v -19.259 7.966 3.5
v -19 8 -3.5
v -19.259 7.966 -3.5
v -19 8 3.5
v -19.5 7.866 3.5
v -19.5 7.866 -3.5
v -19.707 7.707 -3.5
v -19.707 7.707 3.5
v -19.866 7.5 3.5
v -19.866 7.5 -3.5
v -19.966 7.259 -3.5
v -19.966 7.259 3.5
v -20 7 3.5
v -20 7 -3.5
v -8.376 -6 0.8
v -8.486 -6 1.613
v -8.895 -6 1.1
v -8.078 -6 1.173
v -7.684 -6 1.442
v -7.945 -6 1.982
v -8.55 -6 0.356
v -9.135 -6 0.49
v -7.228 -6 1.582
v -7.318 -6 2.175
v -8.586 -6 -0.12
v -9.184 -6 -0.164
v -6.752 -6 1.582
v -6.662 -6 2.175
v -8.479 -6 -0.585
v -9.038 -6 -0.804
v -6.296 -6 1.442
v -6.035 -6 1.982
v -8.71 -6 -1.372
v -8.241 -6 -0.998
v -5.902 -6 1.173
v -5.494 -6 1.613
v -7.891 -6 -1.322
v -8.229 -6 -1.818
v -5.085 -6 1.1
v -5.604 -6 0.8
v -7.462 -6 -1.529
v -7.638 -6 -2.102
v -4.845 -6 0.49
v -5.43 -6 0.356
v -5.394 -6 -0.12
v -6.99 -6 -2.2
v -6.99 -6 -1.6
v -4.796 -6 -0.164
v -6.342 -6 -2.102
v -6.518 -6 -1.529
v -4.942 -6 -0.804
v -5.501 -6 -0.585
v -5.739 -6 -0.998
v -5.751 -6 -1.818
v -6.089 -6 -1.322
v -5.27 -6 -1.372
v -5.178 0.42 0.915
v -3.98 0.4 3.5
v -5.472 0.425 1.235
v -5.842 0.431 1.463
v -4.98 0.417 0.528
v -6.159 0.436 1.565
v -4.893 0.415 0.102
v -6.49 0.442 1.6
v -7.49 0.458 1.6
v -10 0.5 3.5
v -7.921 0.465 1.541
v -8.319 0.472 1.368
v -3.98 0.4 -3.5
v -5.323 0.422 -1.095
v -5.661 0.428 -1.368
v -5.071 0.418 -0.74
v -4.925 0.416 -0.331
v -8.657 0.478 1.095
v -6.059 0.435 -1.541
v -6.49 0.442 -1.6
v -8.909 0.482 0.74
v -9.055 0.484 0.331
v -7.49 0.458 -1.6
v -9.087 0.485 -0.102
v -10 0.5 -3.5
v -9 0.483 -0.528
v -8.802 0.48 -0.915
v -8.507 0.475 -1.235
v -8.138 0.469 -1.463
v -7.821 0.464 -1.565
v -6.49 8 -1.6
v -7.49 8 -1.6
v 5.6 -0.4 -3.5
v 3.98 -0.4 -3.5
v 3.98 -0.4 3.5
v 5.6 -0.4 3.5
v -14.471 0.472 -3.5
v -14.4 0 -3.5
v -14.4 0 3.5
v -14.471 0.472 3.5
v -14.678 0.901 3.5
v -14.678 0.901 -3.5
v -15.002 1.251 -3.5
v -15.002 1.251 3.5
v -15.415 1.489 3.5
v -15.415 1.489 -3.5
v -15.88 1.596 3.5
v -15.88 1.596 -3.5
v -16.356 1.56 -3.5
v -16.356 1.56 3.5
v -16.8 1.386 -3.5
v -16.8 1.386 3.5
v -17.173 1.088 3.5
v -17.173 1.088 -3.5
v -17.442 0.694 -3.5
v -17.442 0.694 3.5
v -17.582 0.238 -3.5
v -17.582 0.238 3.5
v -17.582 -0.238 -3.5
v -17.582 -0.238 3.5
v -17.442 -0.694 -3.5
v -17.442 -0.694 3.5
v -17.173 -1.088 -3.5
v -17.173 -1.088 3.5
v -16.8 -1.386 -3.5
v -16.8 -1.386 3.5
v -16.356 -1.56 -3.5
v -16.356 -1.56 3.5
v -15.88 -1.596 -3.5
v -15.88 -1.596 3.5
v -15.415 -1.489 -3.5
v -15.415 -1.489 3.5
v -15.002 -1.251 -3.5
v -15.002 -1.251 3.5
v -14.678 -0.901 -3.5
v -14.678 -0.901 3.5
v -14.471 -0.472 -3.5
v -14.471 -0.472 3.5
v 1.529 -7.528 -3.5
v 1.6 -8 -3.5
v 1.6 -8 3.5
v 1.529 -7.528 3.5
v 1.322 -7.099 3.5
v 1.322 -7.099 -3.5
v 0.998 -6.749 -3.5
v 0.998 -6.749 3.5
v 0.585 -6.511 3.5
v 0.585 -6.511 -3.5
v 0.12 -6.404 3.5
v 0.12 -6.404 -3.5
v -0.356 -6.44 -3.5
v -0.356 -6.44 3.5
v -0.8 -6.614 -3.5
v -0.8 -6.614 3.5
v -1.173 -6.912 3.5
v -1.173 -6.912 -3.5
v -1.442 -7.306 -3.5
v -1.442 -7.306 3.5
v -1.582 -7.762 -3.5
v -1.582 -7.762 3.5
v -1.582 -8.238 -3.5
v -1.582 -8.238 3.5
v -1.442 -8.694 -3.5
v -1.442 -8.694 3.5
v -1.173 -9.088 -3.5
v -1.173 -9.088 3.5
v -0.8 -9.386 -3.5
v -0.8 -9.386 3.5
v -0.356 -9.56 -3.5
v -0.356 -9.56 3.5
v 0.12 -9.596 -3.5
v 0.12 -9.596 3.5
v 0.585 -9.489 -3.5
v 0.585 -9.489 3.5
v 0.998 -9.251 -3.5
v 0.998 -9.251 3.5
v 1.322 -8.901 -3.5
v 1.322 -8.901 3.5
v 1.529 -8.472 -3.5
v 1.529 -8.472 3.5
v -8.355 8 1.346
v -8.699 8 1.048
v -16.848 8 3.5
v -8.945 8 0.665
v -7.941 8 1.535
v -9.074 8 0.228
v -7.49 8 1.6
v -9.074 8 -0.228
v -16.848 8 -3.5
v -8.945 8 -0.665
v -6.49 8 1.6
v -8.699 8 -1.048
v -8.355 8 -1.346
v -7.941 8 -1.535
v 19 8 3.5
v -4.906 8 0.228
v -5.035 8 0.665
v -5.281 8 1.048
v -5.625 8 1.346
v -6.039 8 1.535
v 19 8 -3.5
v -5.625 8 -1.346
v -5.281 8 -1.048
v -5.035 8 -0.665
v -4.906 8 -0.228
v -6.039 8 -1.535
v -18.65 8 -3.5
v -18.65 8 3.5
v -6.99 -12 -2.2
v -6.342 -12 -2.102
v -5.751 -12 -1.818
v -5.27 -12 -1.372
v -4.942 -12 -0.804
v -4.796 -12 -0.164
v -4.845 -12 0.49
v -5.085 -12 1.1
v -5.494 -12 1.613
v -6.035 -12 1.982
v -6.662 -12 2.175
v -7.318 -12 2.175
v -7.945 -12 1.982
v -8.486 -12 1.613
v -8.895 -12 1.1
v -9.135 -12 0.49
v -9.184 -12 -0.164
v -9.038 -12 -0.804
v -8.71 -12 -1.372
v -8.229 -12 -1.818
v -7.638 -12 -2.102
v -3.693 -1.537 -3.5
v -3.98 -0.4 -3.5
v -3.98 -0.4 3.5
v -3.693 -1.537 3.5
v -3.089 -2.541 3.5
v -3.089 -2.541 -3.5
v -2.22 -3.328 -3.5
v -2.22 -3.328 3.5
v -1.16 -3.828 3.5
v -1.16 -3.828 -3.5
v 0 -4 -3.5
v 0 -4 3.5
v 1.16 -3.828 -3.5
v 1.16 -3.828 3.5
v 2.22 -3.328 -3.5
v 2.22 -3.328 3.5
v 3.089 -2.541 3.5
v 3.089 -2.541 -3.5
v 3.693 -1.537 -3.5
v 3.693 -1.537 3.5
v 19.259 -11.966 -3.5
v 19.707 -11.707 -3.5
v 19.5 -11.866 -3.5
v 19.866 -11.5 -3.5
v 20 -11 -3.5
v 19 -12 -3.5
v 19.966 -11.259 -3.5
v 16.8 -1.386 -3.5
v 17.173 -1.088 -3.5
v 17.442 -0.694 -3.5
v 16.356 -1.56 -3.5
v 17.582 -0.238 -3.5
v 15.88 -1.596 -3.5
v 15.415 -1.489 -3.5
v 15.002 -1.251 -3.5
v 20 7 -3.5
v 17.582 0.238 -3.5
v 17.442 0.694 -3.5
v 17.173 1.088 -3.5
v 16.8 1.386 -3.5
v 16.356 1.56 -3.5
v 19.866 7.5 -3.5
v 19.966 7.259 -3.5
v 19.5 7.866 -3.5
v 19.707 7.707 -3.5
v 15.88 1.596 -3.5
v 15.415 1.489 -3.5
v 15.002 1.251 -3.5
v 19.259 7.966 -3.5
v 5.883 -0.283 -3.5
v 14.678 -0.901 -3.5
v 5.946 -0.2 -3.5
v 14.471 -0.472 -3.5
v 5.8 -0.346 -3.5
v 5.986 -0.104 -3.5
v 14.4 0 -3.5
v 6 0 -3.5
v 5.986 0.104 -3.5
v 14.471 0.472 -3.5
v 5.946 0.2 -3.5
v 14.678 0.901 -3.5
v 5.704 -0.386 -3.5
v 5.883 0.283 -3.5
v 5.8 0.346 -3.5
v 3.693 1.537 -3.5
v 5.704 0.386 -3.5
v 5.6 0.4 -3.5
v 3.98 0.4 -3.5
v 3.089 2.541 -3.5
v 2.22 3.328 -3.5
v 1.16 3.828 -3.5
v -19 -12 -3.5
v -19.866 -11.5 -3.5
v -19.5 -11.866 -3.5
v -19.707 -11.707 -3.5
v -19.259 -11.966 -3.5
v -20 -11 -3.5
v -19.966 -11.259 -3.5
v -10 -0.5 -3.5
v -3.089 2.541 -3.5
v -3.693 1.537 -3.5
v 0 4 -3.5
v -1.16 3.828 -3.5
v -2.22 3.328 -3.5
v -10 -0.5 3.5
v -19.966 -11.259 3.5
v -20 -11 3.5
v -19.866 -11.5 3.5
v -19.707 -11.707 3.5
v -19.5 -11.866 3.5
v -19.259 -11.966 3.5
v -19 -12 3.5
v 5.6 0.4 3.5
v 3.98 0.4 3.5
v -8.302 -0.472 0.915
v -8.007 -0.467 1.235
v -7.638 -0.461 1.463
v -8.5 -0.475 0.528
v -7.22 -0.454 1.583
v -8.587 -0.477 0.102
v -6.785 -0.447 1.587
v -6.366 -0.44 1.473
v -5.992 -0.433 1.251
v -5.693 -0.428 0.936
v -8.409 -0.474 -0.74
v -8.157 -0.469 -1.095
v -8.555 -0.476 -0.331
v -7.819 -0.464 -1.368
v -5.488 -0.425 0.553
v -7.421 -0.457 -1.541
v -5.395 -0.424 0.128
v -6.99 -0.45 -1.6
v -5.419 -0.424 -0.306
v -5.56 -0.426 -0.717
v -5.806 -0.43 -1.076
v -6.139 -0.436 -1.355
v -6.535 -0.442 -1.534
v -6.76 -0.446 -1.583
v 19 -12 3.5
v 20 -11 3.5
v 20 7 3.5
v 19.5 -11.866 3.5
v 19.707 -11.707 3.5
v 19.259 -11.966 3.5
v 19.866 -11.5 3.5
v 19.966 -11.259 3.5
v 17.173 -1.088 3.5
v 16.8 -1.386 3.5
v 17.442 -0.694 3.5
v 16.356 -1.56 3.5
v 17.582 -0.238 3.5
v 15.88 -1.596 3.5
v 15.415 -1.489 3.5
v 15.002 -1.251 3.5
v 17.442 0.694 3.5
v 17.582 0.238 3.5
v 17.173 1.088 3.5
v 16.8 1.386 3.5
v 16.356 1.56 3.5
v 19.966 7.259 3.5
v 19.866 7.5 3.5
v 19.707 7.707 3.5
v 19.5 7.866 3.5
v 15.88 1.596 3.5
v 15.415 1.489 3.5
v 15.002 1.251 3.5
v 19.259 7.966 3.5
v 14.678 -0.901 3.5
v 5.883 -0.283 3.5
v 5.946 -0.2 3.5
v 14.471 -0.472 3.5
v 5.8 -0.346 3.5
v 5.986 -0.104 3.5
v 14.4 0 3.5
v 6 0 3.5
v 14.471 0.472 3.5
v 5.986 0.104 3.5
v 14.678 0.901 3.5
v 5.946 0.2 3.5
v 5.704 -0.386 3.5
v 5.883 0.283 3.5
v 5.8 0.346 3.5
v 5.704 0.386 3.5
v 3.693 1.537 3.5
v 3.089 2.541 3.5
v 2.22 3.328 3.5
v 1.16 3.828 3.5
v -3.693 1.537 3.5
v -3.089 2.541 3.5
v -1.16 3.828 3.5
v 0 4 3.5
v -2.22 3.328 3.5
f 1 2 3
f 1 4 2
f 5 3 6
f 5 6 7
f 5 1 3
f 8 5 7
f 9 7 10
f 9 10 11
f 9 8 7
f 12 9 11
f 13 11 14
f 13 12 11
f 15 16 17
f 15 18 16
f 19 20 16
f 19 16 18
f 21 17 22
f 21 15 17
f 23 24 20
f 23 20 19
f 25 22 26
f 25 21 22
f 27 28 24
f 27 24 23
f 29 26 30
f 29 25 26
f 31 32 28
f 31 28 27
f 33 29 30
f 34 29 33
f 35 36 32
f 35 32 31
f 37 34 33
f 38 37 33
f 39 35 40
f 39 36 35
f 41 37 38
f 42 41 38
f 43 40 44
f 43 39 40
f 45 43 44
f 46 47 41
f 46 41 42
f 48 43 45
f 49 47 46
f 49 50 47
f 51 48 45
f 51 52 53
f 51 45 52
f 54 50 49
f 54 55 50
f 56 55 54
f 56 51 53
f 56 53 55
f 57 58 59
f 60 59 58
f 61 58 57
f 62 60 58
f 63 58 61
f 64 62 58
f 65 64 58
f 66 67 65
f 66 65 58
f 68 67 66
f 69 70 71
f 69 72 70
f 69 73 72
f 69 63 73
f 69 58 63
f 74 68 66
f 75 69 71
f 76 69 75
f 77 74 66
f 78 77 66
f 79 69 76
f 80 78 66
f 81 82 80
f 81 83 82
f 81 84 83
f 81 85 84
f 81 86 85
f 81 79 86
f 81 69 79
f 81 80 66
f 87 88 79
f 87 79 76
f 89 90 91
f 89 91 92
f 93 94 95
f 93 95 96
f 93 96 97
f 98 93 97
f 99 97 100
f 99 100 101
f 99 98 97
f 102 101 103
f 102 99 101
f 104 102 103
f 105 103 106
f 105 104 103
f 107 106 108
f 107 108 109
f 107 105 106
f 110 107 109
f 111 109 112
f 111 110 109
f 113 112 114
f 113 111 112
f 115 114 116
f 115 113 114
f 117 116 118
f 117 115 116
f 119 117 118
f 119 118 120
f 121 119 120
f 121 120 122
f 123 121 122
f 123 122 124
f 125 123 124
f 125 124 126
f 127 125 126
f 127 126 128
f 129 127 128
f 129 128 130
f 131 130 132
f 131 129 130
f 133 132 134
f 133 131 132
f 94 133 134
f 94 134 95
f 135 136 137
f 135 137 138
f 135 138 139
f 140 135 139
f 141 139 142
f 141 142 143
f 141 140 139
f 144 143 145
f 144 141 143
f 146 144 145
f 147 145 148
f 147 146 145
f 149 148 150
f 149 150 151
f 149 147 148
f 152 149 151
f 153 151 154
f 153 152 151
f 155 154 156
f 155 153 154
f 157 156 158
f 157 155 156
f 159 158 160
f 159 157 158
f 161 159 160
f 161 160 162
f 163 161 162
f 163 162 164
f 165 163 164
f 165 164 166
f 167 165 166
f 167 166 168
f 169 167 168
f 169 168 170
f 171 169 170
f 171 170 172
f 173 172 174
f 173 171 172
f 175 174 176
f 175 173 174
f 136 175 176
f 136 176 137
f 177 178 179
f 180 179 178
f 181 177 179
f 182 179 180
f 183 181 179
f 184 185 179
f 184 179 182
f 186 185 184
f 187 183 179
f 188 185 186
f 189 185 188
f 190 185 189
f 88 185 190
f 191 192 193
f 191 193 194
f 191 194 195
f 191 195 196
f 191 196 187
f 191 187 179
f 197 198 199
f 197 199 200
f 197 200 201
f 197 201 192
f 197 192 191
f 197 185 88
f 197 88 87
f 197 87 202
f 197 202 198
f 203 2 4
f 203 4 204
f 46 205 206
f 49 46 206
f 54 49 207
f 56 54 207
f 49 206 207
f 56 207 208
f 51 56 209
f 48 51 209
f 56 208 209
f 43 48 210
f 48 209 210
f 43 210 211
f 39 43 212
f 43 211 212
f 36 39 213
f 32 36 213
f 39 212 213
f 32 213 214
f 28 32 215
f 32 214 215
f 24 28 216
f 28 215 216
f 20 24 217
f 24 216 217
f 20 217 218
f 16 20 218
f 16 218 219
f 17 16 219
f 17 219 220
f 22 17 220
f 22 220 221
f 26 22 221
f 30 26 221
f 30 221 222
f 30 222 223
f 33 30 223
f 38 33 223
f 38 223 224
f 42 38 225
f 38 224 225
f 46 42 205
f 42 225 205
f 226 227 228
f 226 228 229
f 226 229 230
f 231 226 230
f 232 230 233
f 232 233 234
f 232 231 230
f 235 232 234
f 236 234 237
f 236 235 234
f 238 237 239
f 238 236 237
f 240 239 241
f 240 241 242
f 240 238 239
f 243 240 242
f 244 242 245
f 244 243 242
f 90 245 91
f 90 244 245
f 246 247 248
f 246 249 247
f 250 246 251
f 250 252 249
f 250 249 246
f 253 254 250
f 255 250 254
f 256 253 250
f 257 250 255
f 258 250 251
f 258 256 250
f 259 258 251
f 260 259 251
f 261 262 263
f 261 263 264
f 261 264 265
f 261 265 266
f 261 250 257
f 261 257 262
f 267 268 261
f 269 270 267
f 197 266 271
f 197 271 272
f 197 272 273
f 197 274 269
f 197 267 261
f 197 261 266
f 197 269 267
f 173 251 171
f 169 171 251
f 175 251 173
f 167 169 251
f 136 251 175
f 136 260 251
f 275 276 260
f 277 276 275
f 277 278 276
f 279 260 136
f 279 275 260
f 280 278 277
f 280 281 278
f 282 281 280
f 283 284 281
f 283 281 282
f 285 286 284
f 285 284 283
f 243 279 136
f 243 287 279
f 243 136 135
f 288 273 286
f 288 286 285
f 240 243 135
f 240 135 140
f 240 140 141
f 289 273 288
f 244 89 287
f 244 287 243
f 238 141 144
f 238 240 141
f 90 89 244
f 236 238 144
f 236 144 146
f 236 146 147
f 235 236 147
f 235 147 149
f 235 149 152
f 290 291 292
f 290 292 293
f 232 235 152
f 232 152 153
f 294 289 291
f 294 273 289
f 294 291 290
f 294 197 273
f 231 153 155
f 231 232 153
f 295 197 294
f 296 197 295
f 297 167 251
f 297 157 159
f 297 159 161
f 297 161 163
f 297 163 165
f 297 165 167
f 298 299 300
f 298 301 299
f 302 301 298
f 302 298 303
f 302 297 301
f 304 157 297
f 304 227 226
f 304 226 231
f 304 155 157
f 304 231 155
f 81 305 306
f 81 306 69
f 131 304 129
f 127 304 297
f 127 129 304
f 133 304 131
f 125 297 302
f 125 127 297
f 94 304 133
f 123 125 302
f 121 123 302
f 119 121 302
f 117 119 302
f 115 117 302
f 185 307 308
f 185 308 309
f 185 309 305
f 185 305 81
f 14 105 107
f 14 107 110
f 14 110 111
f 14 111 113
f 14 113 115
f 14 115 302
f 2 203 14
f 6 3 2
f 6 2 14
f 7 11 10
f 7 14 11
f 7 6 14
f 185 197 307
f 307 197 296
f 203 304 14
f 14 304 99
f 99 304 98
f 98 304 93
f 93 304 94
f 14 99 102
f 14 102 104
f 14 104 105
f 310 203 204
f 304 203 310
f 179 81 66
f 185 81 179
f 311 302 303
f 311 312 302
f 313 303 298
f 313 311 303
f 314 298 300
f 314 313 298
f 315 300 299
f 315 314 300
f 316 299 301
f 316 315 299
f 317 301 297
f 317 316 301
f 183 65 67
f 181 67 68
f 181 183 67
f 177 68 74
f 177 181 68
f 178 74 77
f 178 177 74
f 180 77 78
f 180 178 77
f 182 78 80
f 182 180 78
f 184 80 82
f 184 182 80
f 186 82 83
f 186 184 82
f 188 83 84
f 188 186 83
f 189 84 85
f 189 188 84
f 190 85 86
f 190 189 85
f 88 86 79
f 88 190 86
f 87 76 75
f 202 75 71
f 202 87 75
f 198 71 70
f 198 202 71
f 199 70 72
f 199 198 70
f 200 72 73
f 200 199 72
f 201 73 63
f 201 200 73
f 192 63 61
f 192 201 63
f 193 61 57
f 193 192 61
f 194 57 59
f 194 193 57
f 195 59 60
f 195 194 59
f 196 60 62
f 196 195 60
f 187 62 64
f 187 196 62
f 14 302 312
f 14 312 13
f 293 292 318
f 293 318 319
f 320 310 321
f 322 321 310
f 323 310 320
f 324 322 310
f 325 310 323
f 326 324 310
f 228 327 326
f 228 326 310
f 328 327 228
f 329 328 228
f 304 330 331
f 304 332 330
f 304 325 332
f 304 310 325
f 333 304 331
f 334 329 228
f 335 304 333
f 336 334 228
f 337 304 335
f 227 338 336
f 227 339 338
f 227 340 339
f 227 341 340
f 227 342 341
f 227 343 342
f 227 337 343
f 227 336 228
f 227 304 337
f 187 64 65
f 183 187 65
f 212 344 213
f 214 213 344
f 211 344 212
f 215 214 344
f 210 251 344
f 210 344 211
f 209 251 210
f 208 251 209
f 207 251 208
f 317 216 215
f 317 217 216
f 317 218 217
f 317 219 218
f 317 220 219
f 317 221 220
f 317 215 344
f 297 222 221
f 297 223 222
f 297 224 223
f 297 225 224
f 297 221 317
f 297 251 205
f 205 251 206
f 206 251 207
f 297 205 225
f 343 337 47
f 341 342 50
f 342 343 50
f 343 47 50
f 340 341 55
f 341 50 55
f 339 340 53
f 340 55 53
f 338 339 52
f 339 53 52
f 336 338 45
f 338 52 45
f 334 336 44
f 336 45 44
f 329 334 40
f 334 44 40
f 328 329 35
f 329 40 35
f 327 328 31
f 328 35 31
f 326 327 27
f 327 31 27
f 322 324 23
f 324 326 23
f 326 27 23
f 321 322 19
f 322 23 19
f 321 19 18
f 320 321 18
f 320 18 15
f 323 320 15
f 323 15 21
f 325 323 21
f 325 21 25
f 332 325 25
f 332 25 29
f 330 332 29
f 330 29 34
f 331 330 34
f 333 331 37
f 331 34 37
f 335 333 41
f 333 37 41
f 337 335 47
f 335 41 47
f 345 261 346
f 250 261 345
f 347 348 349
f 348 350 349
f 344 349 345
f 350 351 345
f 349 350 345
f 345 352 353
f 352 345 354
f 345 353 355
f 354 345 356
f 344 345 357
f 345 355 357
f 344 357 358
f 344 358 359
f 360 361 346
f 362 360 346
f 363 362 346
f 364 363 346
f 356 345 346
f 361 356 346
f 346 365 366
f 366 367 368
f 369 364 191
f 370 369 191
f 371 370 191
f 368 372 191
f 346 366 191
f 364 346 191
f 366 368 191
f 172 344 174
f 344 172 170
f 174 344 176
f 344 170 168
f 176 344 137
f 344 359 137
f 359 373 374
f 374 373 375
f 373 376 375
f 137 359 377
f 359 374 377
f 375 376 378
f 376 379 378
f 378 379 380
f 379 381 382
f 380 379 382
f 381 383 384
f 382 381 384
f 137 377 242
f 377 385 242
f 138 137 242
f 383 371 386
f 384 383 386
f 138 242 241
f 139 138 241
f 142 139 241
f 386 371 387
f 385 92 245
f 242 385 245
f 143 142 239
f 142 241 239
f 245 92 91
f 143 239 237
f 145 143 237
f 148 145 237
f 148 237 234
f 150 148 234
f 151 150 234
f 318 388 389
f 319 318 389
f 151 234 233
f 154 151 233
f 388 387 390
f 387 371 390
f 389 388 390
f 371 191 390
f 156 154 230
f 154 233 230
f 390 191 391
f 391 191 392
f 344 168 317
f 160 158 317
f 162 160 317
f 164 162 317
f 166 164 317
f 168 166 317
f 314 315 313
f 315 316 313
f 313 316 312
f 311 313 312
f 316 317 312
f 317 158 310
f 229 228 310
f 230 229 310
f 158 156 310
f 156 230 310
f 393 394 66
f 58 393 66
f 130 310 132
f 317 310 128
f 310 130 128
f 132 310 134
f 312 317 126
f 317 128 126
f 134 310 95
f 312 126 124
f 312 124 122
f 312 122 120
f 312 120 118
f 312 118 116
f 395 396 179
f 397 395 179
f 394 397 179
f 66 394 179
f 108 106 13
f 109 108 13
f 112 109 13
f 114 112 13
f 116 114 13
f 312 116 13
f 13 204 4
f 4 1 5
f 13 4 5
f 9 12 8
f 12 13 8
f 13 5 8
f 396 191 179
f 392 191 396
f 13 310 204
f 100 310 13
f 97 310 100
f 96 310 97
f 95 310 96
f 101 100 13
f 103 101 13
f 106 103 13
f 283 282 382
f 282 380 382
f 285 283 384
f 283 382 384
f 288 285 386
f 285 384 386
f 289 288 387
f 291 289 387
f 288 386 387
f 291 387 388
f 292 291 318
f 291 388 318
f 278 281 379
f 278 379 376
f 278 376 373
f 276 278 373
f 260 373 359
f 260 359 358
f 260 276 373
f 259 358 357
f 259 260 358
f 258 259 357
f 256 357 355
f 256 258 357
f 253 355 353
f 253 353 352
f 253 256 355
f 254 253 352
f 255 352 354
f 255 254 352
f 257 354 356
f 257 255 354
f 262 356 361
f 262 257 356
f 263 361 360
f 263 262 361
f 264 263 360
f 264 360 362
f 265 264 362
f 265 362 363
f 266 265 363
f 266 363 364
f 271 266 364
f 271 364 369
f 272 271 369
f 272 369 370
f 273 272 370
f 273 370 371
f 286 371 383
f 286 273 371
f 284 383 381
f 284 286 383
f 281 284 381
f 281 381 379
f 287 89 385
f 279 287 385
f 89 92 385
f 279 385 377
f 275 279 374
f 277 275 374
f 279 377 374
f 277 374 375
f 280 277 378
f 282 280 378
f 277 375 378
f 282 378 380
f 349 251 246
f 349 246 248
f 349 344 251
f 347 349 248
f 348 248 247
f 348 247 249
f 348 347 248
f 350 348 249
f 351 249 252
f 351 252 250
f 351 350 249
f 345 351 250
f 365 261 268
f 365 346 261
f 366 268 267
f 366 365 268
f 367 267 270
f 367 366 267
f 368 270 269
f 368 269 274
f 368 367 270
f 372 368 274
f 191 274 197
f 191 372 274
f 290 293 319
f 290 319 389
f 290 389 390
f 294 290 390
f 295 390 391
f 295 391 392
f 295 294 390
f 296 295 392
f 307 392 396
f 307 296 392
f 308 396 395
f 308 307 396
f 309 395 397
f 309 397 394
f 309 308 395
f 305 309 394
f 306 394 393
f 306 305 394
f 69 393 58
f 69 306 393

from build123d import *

# Parameters (mm, degrees)
BOSS_EXTRUDE1_DEPTH      = 3.5
BOSS_EXTRUDE1_DEPTH_BACK = 3.5
SKETCH1_R                = 1.6
CUT_EXTRUDE1_REACH       = 30.5
SKETCH3_R                = 1.6
SKETCH3_3_R              = 2.2
SKETCH3_3_R_2            = 1.6
CUT_EXTRUDE2_DEPTH       = 6
CUT_EXTRUDE3_REACH       = 30.5
FILLET1_R                = 1
FILLET2_R                = 0.4


with BuildPart() as part:
    # Sketch1 → Boss-Extrude1 (new, two sides: drawn at the far end of the back side and taken through both)
    with BuildSketch(Plane.XY.offset(-BOSS_EXTRUDE1_DEPTH_BACK)):
        with BuildLine():
            Line((-20, 8), (-18.64966284, 8))
            Line((-18.64966284, 8), (-10, -0.5))
            Line((-10, -0.5), (-3.979949748, -0.4))
            ThreePointArc((-3.979949748, -0.4), (0, -4), (3.979949748, -0.4))
            Line((3.979949748, -0.4), (6, -0.4))
            Line((6, -0.4), (6, 0.4))
            Line((6, 0.4), (3.979949748, 0.4))
            ThreePointArc((3.979949748, 0.4), (0, 4), (-3.979949748, 0.4))
            Line((-3.979949748, 0.4), (-10, 0.5))
            Line((-10, 0.5), (-16.848441102, 8))
            Line((-16.848441102, 8), (20, 8))
            Line((20, 8), (20, -12))
            Line((20, -12), (-20, -12))
            Line((-20, -12), (-20, 8))
        make_face()
        with Locations((-16, 0)):
            Circle(SKETCH1_R, mode=Mode.SUBTRACT)
        with Locations(Location((16, 0, 0), (0, 0, 180))):
            Circle(SKETCH1_R, mode=Mode.SUBTRACT)
        with Locations((0, -8)):
            Circle(SKETCH1_R, mode=Mode.SUBTRACT)
    extrude(amount=BOSS_EXTRUDE1_DEPTH + BOSS_EXTRUDE1_DEPTH_BACK)

    # Cut-Extrude1: up to this plane
    cut_extrude1_end = Plane(origin=(-10, -0.5, -3.5), z_dir=(-0.016608865731892127, 0.9998620632762801, 0))
    # Sketch3 → Cut-Extrude1 (cut, up to the surface)
    with BuildSketch(Plane.XZ.offset(12), mode=Mode.PRIVATE) as cut_extrude1_sk1:
        with Locations(Location((-6.989974874, 0, 0), (0, 0, 270))):
            Circle(SKETCH3_R)
    cut_extrude1_tool1 = split(extrude(cut_extrude1_sk1.sketch, amount=-CUT_EXTRUDE1_REACH, mode=Mode.PRIVATE), bisect_by=cut_extrude1_end, keep=Keep.BOTH, mode=Mode.PRIVATE)
    add(cut_extrude1_tool1.solids().sort_by_distance((-6.989975, -12, 0))[0], mode=Mode.SUBTRACT)

    # Sketch3<3> → Cut-Extrude2 (cut)
    with BuildSketch(Plane.XZ.offset(12)):
        with Locations(Location((-6.989974874, 0, 0), (0, 0, 270))):
            Circle(SKETCH3_3_R)
        with Locations(Location((-6.989974874, 0, 0), (0, 0, 270))):
            Circle(SKETCH3_3_R_2, mode=Mode.SUBTRACT)
    extrude(amount=-CUT_EXTRUDE2_DEPTH, mode=Mode.SUBTRACT)

    # Cut-Extrude3: up to this plane
    cut_extrude3_end = Plane(origin=(-10, 0.5, -3.5), z_dir=(-0.016608865731892127, -0.9998620632762801, 0))
    # Sketch4 → Cut-Extrude3 (cut, up to the surface)
    with BuildSketch(Plane(origin=(0, 8, 0), x_dir=(1, 0, 0), z_dir=(0, 1, 0)), mode=Mode.PRIVATE) as cut_extrude3_sk1:
        with BuildLine():
            Line((-7.489974874, 1.6), (-6.489974874, 1.6))
            ThreePointArc((-6.489974874, 1.6), (-4.889974874, 0), (-6.489974874, -1.6))
            Line((-6.489974874, -1.6), (-7.489974874, -1.6))
            ThreePointArc((-7.489974874, -1.6), (-9.089974874, 0), (-7.489974874, 1.6))
        make_face()
    cut_extrude3_tool1 = split(extrude(cut_extrude3_sk1.sketch, amount=-CUT_EXTRUDE3_REACH, mode=Mode.PRIVATE), bisect_by=cut_extrude3_end, keep=Keep.BOTH, mode=Mode.PRIVATE)
    add(cut_extrude3_tool1.solids().sort_by_distance((-6.989975, 8, 0))[0], mode=Mode.SUBTRACT)

    # Fillet1
    fillet1_edges = [part.edges().sort_by_distance(p)[0] for p in [
        (20, 8, 0),
        (20, -12, 0),
        (-20, -12, 0),
        (-20, 8, 0),
    ]]
    fillet(fillet1_edges, radius=FILLET1_R)

    # Fillet2
    fillet2_edges = [part.edges().sort_by_distance(p)[0] for p in [
        (6, -0.4, 0),
        (6, 0.4, 0),
    ]]
    fillet(fillet2_edges, radius=FILLET2_R - 0.0001)  # a hair under: the kernel refuses the full size


solid = part.part
